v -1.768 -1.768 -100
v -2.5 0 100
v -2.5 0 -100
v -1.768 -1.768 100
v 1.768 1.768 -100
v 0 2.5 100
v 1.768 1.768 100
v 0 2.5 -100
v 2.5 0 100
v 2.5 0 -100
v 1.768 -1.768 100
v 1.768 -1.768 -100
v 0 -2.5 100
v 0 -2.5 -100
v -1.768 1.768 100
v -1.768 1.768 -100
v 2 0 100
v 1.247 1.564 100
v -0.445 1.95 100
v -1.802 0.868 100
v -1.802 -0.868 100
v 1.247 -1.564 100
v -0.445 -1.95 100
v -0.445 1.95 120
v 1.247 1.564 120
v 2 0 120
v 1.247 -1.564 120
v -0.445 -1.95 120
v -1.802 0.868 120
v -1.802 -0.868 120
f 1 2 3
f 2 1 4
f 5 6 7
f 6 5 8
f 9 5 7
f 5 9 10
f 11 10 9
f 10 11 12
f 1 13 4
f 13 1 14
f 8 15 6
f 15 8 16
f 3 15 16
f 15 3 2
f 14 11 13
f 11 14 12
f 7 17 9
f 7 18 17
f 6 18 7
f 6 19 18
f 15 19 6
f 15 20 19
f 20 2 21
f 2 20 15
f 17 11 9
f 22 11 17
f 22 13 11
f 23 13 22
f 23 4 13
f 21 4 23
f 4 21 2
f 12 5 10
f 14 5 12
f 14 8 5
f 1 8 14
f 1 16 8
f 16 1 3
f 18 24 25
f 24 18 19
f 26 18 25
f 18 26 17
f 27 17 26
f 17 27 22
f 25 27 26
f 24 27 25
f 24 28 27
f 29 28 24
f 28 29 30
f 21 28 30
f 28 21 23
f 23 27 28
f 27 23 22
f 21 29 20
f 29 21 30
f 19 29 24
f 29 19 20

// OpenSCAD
// file: ../conf/parameters.scad
//rendering
epsilon=0.01;

//model
frame_length=1000;
frame_inner=19;
frame_outer=20;

support_width=100;
support_height=0.2;
support_inner=90;
support_diameter=3;

rack_width=150;
rack_inner=140;
rack_diameter=3;

stand_height=200;
stand_width=200;
stand_diameter=5;
stand_head_height=20;
stand_head_diameter=4;

foot_outer=12;
foot_inner=10;
foot_length=500;

motor_hole_distance=450;
motor_hole_diameter=12;
motor_mount_distance=19;
motor_mount_diameter=3;
// main file
include <../conf/parameters.scad>

module stand() {

union() {

	color("silver")
	cylinder(stand_height,d=stand_diameter, center=true);

	color("grey")
	translate([0,0,stand_height/2])
	cylinder(stand_head_height,d=stand_head_diameter, center=false);

}
}

stand();
